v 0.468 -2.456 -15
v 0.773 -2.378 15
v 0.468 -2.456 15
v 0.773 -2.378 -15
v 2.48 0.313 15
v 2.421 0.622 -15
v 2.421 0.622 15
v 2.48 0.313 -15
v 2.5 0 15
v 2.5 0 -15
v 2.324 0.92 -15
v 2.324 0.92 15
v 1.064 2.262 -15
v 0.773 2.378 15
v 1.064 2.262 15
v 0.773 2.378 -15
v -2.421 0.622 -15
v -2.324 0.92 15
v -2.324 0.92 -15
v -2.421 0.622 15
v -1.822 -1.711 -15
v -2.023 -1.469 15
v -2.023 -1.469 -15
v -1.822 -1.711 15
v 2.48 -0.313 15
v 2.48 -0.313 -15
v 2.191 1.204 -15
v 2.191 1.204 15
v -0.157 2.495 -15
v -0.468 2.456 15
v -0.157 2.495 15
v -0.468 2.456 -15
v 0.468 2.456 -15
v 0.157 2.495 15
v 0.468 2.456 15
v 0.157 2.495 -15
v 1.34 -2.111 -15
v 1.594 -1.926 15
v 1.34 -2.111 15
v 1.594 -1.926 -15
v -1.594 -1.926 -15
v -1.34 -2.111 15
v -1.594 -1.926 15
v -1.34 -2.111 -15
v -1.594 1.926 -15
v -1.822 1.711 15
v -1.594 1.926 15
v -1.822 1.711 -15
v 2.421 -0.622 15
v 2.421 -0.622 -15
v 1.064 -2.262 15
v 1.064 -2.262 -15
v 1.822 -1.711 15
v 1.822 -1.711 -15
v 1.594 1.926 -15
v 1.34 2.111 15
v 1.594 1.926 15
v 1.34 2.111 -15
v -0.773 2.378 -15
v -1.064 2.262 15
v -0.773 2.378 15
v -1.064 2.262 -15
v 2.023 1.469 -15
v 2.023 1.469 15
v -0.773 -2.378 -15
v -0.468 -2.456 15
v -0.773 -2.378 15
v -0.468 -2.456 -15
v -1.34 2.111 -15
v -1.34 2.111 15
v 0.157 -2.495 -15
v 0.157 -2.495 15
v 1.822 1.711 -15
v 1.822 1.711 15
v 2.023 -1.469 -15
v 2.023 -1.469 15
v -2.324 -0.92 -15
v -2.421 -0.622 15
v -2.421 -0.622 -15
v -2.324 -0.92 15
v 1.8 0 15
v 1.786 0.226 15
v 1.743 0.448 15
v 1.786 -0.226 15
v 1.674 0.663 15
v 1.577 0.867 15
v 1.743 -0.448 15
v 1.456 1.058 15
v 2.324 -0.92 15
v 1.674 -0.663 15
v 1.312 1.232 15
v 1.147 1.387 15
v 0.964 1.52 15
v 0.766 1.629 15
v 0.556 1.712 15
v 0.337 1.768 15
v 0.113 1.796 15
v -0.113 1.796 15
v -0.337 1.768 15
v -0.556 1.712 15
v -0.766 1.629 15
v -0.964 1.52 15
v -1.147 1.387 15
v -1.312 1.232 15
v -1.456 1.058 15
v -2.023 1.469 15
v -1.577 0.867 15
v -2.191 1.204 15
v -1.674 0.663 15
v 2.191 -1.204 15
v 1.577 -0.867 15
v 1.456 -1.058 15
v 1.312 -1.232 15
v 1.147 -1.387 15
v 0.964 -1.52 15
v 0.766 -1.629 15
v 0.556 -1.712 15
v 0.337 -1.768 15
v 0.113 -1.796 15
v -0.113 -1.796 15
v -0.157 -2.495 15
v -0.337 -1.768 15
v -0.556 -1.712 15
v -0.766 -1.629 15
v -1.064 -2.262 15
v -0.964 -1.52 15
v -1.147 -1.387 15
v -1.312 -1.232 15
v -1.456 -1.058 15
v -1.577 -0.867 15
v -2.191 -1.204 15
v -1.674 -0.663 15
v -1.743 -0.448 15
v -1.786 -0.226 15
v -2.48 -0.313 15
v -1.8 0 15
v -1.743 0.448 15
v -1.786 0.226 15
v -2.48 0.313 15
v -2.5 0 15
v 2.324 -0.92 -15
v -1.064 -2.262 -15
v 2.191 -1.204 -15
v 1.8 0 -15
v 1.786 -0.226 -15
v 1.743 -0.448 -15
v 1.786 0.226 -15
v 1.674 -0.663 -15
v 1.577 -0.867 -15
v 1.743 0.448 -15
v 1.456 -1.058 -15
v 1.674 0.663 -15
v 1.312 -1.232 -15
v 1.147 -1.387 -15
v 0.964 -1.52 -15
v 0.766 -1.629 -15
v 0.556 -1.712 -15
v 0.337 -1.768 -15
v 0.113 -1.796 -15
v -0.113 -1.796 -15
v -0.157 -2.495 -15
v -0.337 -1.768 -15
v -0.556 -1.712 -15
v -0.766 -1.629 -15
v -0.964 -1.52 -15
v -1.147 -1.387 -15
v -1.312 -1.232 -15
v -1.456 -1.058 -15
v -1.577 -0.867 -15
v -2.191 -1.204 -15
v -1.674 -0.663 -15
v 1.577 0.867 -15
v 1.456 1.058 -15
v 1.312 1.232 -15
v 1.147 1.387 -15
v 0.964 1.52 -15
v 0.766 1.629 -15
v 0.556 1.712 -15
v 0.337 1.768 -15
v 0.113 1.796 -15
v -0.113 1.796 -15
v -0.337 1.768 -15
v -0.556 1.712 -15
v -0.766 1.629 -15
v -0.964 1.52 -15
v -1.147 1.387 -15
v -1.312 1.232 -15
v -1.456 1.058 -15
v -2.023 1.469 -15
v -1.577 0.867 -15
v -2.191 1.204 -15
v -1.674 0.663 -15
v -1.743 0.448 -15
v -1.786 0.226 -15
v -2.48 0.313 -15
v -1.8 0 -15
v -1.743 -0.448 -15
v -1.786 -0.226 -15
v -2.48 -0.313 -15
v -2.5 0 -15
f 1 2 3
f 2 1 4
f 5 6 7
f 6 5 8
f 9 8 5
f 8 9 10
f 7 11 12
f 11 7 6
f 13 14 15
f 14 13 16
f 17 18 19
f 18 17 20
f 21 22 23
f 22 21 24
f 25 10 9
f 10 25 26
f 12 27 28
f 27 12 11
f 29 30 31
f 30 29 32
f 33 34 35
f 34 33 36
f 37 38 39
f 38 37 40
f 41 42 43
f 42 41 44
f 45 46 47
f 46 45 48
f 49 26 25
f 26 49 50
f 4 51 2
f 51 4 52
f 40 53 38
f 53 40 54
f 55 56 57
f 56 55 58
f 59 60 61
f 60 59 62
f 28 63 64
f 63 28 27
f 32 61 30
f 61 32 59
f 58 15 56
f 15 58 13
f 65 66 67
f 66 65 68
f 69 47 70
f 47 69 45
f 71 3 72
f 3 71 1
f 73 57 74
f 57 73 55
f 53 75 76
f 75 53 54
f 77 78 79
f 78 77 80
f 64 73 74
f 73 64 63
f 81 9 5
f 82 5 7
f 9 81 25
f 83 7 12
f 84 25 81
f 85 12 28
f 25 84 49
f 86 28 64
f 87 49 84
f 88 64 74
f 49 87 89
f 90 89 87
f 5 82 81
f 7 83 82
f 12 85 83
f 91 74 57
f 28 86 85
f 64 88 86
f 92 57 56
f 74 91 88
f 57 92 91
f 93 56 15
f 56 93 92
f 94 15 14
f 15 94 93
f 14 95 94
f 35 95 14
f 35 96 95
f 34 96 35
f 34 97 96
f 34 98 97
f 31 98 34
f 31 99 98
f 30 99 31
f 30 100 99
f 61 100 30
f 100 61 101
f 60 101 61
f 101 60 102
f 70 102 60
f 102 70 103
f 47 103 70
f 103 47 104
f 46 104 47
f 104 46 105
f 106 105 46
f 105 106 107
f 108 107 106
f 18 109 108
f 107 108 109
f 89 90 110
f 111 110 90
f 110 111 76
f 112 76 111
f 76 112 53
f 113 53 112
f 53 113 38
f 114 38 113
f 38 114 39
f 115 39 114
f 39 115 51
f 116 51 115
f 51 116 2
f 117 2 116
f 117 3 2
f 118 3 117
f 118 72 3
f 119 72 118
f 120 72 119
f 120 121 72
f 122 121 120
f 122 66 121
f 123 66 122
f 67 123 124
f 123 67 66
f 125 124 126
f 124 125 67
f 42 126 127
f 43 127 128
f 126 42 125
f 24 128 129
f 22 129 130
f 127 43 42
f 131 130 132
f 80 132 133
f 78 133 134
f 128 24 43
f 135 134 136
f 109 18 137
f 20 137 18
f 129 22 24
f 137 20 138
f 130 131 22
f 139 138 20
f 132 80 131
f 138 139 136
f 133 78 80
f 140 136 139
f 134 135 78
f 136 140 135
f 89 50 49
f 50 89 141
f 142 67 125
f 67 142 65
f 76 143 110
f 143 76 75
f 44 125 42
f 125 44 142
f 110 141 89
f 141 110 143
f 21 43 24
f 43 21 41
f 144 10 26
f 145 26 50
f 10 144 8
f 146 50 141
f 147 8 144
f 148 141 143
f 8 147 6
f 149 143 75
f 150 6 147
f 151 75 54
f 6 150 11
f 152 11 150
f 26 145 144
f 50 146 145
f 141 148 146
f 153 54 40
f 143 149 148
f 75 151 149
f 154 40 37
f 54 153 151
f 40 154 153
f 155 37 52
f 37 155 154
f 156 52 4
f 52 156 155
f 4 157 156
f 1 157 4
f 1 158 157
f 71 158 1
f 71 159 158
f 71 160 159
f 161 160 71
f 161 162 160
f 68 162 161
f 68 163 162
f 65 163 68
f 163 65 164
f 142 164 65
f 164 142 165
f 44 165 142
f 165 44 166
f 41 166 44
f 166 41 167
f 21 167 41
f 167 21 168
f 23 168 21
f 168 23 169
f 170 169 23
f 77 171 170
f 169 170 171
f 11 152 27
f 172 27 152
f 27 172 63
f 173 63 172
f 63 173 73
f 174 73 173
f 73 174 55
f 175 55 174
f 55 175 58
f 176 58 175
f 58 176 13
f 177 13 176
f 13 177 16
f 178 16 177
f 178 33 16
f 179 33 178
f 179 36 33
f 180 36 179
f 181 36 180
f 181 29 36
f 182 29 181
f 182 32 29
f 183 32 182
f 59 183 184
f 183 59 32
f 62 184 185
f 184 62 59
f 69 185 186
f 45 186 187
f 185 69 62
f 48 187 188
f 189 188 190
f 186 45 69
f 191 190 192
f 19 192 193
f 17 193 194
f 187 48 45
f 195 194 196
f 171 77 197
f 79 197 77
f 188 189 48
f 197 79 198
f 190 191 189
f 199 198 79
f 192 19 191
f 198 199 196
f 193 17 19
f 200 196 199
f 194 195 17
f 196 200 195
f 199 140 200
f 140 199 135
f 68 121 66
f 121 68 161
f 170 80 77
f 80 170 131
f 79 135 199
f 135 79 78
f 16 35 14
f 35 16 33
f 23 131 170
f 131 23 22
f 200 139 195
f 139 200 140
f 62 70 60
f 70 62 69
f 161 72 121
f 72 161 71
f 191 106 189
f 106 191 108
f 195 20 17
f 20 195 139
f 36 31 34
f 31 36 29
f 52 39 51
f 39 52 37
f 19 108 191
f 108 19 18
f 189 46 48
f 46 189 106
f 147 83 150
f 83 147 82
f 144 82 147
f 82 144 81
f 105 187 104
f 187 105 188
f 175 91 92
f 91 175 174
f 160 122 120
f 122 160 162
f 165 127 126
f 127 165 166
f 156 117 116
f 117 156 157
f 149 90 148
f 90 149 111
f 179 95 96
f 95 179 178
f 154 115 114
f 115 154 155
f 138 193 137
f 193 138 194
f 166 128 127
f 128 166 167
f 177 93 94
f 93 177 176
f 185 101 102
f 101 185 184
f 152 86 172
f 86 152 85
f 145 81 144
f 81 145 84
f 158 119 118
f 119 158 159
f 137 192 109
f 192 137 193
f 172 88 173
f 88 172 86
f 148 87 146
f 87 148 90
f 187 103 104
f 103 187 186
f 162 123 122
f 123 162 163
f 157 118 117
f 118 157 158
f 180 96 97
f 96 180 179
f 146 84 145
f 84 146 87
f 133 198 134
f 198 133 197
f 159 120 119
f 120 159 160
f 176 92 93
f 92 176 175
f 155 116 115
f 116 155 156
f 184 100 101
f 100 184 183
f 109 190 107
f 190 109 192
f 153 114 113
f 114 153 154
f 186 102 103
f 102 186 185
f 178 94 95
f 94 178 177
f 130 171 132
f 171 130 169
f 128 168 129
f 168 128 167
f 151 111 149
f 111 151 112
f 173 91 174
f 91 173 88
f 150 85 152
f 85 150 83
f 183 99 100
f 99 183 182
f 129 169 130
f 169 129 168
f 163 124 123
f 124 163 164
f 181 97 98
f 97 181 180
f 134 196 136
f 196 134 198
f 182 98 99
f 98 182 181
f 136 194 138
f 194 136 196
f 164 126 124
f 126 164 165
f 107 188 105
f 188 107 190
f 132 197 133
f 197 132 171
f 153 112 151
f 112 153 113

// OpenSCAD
$fn = 50;


difference() {
	union() {
		translate(v = [0, 0, -15.0000000000]) {
			cylinder(h = 30, r = 2.5000000000);
		}
	}
	union() {
		#translate(v = [0, 0, -100.0000000000]) {
			cylinder(h = 200, r = 1.8000000000);
		}
	}
}
